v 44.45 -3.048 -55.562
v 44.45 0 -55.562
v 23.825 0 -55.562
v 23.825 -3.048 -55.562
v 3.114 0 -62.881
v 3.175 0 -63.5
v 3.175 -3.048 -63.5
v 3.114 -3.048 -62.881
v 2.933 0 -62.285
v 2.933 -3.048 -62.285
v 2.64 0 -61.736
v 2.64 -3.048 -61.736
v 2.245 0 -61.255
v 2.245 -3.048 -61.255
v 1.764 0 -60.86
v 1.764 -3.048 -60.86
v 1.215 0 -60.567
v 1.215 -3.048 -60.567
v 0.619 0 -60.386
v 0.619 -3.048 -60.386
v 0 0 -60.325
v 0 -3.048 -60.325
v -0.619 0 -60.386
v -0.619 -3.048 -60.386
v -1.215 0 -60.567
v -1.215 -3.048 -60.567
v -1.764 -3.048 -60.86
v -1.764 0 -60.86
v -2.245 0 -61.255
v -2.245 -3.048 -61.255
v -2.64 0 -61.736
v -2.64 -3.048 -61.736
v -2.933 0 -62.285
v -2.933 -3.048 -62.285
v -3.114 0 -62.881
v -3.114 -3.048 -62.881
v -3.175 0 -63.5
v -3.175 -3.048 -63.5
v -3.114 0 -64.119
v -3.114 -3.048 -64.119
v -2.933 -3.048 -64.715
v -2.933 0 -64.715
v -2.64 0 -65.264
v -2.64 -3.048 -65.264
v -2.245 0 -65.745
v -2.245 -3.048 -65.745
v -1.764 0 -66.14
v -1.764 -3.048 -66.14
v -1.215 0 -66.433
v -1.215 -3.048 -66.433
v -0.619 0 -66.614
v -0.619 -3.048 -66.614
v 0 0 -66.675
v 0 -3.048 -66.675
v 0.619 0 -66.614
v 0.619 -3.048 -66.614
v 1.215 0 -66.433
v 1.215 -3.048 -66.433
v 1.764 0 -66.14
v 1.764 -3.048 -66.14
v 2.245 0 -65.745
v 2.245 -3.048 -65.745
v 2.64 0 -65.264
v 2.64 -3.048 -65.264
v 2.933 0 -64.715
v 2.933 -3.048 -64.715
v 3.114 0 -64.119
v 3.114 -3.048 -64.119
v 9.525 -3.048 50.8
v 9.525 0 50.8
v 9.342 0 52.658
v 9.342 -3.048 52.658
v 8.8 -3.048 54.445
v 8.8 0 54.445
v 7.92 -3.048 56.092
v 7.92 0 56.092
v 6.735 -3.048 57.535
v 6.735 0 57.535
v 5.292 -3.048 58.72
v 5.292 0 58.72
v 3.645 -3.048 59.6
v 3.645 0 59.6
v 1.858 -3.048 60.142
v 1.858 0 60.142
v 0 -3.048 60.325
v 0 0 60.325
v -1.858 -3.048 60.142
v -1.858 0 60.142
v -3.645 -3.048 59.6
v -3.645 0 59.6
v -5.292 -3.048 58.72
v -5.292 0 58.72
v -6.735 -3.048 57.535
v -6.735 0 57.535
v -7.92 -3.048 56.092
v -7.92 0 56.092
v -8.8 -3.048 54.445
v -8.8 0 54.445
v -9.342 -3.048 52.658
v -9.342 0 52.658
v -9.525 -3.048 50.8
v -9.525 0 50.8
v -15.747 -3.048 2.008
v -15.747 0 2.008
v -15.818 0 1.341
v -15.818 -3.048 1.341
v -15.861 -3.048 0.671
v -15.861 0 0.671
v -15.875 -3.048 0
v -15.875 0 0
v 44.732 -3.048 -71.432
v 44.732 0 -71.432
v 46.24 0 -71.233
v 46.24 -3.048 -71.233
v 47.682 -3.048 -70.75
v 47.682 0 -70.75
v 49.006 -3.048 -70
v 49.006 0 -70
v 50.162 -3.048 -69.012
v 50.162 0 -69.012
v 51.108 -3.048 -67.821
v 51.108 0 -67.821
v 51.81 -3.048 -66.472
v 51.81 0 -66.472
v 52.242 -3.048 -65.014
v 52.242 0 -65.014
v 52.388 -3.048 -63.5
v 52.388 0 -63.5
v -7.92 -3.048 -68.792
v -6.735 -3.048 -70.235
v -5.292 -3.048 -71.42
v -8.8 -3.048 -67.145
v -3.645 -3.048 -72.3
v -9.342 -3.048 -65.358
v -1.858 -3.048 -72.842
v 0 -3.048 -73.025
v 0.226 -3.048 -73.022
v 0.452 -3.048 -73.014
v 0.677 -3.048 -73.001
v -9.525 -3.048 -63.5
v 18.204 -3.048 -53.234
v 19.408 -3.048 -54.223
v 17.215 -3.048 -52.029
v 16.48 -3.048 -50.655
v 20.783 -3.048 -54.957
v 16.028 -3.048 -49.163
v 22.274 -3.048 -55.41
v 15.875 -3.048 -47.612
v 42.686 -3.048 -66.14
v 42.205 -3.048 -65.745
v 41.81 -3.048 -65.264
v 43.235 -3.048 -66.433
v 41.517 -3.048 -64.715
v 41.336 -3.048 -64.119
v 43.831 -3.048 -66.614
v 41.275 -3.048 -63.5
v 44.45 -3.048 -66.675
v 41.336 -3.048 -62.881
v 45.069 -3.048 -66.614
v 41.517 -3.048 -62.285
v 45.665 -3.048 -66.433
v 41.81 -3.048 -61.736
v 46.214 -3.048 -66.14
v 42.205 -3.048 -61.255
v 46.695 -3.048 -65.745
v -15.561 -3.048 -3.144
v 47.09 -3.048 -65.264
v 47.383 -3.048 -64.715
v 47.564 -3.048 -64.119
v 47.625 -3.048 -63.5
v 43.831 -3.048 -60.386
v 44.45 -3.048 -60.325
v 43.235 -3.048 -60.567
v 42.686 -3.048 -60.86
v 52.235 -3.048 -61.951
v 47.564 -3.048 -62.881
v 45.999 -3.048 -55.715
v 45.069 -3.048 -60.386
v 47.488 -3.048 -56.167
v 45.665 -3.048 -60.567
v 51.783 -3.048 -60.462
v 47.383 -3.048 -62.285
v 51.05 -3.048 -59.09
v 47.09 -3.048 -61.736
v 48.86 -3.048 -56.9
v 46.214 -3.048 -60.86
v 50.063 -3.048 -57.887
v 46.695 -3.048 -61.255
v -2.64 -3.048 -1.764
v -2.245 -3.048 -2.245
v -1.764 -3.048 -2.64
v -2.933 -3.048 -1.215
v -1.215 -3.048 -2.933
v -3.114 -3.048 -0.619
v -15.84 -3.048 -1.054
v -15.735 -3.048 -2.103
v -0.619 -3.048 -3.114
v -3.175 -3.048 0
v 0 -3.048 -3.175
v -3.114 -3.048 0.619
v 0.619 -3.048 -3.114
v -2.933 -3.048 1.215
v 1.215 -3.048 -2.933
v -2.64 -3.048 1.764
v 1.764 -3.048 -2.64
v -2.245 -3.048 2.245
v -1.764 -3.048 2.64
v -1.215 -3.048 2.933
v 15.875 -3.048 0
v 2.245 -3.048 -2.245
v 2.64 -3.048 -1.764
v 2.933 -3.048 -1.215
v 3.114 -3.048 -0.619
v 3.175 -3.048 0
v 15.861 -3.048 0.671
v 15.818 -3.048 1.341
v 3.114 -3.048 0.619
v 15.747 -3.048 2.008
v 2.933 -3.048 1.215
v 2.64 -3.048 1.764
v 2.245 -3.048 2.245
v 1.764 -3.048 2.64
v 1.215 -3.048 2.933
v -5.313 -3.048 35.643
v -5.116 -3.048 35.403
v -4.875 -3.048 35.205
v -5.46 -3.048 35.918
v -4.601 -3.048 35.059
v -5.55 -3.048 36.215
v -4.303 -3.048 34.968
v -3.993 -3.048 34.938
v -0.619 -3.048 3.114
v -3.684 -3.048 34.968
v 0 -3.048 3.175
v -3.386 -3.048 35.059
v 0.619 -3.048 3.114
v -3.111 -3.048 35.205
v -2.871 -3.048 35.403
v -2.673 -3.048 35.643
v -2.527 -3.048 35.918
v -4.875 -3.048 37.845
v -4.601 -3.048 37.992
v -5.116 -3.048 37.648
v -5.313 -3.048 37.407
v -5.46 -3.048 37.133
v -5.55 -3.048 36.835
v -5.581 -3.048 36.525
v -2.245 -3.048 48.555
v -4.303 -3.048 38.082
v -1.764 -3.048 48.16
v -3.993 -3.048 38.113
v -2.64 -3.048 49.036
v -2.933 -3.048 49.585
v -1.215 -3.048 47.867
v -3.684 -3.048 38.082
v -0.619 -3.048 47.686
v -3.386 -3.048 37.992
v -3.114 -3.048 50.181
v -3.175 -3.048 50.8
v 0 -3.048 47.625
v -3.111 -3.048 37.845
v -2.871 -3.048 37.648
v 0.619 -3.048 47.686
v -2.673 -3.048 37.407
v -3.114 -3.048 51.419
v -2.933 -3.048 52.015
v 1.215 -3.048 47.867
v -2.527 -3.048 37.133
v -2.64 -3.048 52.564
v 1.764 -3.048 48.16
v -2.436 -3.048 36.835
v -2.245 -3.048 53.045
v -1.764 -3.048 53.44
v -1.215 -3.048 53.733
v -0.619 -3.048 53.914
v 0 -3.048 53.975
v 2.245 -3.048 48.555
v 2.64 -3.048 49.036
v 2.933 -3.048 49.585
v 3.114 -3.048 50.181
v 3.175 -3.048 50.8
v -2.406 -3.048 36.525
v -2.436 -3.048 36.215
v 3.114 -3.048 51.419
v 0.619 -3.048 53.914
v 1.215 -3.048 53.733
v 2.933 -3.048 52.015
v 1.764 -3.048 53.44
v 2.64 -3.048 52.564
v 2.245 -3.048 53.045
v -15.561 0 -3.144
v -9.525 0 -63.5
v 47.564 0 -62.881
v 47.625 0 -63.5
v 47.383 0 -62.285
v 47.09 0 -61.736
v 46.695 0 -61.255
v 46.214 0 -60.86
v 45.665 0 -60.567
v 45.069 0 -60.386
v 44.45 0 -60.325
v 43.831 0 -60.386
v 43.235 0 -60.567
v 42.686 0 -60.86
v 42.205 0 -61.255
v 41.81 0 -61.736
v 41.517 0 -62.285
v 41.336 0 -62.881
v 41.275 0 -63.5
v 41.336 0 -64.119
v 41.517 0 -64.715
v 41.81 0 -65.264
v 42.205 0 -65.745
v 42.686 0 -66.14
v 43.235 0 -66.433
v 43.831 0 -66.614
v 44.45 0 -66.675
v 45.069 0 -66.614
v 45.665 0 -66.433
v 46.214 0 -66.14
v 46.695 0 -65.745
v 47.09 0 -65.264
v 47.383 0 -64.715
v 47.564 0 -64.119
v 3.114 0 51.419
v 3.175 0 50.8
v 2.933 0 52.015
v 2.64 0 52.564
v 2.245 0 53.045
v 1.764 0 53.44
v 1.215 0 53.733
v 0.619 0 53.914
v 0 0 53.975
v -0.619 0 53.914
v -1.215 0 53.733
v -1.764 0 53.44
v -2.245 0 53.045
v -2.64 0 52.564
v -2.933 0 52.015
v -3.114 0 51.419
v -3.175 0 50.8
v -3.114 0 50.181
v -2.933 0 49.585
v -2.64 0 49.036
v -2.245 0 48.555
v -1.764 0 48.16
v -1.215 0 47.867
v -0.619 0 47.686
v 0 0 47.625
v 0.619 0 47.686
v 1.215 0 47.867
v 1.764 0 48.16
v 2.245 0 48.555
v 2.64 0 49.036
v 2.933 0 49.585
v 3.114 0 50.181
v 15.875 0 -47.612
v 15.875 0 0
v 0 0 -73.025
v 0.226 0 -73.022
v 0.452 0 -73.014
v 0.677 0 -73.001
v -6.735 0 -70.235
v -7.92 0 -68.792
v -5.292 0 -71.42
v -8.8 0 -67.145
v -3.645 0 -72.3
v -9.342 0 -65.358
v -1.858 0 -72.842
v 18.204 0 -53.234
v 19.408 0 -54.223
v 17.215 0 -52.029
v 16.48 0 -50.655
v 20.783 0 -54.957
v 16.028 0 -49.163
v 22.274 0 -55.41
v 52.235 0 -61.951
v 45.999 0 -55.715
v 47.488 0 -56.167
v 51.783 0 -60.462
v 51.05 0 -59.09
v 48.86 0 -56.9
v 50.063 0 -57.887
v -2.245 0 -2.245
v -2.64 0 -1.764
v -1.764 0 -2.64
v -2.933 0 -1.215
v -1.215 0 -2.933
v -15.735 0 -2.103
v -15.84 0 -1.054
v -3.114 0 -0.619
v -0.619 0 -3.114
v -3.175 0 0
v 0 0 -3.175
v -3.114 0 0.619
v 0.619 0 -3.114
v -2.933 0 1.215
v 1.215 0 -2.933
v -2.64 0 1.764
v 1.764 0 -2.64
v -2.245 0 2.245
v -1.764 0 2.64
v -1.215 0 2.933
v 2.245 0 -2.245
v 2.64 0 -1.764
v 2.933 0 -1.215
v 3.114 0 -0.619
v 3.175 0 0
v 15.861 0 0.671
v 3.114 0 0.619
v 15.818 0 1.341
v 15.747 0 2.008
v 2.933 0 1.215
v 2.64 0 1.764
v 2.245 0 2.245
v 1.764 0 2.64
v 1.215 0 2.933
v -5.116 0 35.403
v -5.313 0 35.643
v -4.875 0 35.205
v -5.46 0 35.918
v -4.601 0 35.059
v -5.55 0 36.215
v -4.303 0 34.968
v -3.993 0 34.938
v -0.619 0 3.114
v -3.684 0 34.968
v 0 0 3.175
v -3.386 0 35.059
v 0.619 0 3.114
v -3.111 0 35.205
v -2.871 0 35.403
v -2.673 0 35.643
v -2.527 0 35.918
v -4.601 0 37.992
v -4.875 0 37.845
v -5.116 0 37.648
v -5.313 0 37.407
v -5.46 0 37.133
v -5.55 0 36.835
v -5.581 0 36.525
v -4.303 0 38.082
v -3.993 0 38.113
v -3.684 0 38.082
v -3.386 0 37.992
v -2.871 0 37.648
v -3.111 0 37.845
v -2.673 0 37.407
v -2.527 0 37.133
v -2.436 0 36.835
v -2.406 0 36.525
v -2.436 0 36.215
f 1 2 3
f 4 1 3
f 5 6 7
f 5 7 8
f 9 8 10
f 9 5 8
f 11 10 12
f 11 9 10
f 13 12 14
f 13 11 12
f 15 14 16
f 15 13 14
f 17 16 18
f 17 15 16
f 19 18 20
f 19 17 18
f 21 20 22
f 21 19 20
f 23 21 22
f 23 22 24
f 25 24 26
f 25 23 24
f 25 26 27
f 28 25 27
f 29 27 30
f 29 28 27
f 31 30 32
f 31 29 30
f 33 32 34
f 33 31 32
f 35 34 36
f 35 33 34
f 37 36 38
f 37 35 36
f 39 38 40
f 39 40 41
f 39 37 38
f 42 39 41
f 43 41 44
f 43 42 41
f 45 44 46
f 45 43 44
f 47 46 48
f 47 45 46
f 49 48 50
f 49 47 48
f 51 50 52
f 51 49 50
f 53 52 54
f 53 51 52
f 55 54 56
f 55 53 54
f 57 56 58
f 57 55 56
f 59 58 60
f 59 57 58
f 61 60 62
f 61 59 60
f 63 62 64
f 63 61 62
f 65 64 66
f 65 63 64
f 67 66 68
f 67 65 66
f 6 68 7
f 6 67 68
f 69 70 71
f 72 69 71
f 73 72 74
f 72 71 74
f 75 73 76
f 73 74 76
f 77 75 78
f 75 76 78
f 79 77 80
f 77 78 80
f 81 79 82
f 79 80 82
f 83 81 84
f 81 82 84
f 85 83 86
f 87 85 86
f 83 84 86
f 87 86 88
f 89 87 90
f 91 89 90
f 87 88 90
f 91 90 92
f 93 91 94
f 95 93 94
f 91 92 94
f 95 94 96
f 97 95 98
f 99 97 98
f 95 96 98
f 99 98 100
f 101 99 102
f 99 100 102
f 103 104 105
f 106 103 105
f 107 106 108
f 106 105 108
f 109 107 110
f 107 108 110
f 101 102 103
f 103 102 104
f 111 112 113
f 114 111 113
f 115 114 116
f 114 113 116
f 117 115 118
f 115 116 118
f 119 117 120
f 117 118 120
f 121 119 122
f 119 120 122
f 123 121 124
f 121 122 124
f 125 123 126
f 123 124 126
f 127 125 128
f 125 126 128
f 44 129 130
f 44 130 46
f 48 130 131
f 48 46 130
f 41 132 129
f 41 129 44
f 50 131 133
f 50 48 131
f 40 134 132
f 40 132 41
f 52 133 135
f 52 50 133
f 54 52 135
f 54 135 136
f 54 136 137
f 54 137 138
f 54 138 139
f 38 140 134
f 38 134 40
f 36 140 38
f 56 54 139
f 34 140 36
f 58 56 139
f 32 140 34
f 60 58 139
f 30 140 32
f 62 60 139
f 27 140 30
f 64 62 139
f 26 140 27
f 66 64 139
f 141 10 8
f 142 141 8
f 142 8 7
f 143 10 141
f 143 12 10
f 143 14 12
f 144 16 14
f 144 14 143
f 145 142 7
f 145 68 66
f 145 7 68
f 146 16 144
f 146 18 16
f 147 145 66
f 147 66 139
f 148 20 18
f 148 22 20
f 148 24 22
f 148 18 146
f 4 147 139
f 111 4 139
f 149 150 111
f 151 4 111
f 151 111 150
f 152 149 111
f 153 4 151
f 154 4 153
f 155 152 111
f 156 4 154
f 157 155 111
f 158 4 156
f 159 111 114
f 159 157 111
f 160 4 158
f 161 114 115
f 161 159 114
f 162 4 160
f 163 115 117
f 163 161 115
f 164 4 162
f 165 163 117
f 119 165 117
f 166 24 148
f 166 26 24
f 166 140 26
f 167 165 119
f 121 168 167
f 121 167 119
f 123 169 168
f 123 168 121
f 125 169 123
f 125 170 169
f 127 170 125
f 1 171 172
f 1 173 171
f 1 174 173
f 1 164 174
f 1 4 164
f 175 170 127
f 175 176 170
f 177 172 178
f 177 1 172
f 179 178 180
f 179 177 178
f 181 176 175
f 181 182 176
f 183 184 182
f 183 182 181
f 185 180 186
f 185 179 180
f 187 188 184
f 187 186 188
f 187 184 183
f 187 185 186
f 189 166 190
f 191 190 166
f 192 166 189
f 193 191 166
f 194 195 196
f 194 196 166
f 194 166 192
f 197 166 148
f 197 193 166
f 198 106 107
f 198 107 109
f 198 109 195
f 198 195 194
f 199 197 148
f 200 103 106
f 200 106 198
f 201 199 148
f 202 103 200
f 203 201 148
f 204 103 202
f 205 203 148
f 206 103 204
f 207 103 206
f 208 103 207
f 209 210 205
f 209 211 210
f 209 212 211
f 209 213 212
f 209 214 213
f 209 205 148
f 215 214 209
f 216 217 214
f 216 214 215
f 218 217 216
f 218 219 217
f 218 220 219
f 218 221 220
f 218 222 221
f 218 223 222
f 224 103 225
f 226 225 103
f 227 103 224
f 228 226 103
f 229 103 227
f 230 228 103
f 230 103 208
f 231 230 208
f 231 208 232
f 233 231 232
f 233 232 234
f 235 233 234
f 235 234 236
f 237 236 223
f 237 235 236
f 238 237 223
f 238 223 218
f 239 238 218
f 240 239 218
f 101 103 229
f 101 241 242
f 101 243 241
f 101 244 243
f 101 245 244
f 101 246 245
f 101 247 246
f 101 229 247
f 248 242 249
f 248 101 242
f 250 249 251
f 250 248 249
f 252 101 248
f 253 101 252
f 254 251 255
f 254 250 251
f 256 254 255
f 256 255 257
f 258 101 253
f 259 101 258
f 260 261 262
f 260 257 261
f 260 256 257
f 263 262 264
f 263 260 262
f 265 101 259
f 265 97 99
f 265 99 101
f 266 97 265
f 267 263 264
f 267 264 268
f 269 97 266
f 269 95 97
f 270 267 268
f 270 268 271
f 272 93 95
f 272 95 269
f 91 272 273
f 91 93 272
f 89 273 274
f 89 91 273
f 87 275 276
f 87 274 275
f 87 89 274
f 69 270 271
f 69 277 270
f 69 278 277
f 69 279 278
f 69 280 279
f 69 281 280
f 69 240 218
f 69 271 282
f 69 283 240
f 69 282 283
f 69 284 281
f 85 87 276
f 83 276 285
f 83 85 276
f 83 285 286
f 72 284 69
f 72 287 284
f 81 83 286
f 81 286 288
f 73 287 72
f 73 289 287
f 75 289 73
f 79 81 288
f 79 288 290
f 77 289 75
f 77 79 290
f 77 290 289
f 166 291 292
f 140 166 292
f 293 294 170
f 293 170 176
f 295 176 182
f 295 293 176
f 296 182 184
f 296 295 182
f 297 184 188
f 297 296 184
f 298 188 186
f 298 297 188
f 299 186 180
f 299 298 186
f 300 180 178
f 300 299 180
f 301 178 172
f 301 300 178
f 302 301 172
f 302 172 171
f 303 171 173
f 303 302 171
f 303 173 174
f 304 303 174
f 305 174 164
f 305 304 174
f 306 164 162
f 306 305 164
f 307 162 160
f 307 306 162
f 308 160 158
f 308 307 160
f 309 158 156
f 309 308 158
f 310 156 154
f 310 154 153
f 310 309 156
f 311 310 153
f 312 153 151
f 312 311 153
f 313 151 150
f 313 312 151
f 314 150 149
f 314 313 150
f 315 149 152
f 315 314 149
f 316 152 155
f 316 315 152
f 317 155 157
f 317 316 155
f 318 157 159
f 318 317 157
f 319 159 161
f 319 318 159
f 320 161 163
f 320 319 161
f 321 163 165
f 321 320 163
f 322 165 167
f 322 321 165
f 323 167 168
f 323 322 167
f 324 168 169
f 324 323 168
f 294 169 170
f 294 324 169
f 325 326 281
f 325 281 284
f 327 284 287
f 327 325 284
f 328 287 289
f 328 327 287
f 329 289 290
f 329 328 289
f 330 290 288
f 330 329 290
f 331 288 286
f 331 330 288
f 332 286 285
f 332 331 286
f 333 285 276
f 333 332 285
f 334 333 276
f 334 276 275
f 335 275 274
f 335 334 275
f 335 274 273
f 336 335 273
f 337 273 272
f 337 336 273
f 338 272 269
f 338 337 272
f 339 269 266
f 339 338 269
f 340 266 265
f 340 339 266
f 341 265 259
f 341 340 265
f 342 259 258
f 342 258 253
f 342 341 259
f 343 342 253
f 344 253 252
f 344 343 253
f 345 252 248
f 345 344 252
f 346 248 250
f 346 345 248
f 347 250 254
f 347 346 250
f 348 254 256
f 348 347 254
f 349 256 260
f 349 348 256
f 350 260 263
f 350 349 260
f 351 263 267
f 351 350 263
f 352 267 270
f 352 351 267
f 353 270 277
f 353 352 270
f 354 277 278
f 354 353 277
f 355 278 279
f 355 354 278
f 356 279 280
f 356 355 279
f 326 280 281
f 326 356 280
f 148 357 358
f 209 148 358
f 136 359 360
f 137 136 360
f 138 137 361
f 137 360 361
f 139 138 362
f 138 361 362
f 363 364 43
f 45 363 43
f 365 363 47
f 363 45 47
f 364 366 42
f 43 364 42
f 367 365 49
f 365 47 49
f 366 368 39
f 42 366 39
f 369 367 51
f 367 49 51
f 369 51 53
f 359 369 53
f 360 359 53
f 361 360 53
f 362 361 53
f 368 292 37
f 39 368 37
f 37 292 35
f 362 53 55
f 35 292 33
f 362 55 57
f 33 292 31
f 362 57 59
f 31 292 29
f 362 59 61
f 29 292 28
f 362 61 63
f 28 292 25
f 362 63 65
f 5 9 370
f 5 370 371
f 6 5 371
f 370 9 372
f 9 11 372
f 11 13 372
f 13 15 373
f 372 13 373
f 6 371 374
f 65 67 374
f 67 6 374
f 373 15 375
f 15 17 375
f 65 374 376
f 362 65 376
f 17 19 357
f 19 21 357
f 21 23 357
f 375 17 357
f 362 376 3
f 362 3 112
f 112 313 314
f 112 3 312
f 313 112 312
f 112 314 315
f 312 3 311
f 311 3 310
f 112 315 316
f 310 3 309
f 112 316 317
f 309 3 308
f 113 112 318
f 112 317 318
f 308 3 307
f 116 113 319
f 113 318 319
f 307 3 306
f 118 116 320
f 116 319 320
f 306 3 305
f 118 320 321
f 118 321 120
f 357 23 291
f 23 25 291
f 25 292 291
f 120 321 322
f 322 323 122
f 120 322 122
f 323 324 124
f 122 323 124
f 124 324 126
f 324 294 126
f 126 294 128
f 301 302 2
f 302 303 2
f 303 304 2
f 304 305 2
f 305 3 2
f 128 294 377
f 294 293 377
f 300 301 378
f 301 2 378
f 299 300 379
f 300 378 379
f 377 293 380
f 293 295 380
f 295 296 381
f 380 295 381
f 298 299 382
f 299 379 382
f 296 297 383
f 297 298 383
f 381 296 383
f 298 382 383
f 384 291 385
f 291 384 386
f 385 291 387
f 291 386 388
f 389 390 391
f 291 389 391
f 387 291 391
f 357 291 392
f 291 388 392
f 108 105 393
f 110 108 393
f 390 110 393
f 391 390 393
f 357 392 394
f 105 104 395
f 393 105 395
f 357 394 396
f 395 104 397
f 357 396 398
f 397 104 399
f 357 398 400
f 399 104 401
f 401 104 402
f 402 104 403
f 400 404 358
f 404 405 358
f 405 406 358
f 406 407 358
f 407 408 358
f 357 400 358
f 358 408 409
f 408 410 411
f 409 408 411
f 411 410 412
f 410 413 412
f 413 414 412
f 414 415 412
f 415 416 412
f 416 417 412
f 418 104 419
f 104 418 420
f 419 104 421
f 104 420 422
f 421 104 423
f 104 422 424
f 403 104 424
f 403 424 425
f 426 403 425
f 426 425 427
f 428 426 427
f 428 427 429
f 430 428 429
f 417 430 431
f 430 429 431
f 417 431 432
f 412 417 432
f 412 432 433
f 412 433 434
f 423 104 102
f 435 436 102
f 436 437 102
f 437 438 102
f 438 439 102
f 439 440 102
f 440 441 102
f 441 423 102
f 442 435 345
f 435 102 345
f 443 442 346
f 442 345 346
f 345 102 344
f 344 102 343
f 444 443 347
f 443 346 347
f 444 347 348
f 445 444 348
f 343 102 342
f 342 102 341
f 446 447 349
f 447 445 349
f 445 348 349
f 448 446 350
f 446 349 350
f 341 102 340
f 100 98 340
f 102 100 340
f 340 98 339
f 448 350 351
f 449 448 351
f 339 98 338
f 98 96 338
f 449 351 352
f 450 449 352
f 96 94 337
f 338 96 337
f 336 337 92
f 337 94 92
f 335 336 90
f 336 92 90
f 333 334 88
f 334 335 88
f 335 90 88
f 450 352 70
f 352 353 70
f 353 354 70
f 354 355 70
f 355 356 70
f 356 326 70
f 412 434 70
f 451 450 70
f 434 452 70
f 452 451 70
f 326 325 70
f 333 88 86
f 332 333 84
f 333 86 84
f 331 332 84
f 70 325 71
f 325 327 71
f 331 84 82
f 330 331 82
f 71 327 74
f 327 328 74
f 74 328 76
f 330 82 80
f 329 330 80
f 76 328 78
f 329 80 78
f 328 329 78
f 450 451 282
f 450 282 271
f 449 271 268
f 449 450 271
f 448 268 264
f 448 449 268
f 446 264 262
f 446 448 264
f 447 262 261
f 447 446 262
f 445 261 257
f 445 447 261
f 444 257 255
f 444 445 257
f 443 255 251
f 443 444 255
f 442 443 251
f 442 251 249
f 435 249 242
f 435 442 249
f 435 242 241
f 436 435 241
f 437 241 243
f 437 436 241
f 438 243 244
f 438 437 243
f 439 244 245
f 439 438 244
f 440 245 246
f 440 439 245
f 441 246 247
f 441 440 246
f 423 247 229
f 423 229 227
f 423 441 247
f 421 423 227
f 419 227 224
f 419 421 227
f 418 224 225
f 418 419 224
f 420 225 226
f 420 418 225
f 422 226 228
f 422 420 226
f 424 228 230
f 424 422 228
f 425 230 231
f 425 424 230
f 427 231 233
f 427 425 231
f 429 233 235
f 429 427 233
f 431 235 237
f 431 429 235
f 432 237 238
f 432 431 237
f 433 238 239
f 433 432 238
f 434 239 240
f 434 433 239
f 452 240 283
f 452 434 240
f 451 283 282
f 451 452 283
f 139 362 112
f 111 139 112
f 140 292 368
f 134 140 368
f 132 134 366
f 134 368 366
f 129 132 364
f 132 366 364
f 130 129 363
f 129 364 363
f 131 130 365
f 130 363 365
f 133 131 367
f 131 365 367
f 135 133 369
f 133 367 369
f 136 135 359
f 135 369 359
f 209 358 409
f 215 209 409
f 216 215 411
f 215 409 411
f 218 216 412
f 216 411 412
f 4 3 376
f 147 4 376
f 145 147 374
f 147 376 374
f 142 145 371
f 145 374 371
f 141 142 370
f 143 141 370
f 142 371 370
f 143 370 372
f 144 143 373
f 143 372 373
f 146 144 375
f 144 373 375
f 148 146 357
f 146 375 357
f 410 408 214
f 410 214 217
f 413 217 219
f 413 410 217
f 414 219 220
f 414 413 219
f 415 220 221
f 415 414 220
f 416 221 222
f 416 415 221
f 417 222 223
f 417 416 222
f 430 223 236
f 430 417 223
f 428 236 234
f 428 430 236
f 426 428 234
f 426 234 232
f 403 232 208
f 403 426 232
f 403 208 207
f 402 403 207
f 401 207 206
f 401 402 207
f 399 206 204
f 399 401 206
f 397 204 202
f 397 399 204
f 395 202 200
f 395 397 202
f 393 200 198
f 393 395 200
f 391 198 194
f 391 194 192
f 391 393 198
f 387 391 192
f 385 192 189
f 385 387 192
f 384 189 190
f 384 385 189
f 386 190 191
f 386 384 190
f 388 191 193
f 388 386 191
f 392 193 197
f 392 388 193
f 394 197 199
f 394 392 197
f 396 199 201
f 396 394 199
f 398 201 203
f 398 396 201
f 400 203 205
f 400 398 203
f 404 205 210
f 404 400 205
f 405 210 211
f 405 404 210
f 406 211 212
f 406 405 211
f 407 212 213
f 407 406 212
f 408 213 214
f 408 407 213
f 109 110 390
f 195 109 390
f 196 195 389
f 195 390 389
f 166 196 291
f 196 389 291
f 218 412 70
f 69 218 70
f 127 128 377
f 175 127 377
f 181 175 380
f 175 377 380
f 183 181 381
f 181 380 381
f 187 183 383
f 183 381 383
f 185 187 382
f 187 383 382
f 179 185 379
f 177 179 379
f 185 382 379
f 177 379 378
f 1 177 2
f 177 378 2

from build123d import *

# Parameters (mm, degrees)
F0_R     = 3.175
F0_R_2   = 1.5875
F1_DEPTH = 3.048


with BuildPart() as f1:
    # F0 (on Front) → F1 (new body)
    with BuildSketch(Plane.XZ):
        with BuildLine():
            ThreePointArc((15.747457, 2.008289), (0, 15.875), (-15.747457, 2.008289))
            ThreePointArc((-15.747457, 2.008289), (-15.843082, 1.006168), (-15.875, 0))
            Line((-15.875, 0), (-15.560644, -3.143564))
            ThreePointArc((-15.560644, -3.143564), (1.579622, -15.796215), (15.875, 0))
            ThreePointArc((15.875, 0), (15.843082, 1.006168), (15.747457, 2.008289))
        make_face()
        Circle(F0_R, mode=Mode.SUBTRACT)
        with BuildLine():
            Line((-9.525, 50.8), (-15.747457, 2.008289))
            ThreePointArc((-15.747457, 2.008289), (0, 15.875), (15.747457, 2.008289))
            Line((15.747457, 2.008289), (9.525, 50.8))
            ThreePointArc((9.525, 50.8), (0, 41.275), (-9.525, 50.8))
        make_face()
        with Locations((-3.993369, 36.5252)):
            Circle(F0_R_2, mode=Mode.SUBTRACT)
        with BuildLine():
            Line((-15.560644, -3.143564), (-15.875, 0))
            ThreePointArc((-15.875, 0), (-15.796215, -1.579622), (-15.560644, -3.143564))
        make_face()
        with BuildLine():
            ThreePointArc((9.525, 50.8), (0, 60.325), (-9.525, 50.8))
            ThreePointArc((-9.525, 50.8), (0, 41.275), (9.525, 50.8))
        make_face()
        with Locations((0, 50.8)):
            Circle(F0_R, mode=Mode.SUBTRACT)
        with BuildLine():
            ThreePointArc((15.875, 0), (1.579622, -15.796215), (-15.560644, -3.143564))
            Line((-15.560644, -3.143564), (-9.525, -63.5))
            ThreePointArc((-9.525, -63.5), (0, -53.975), (9.525, -63.5))
            ThreePointArc((9.525, -63.5), (6.970557, -69.991299), (0.677344, -73.000886))
            Line((0.677344, -73.000886), (44.732405, -71.432475))
            ThreePointArc((44.732405, -71.432475), (36.513756, -63.641225), (44.45, -55.5625))
            Line((44.45, -55.5625), (23.8252, -55.5625))
            ThreePointArc((23.8252, -55.5625), (18.20356, -53.23394), (15.875, -47.6123))
            Line((15.875, -47.6123), (15.875, 0))
        make_face()
        with BuildLine():
            ThreePointArc((9.525, -63.5), (0, -53.975), (-9.525, -63.5))
            ThreePointArc((-9.525, -63.5), (-6.735192, -70.235192), (0, -73.025))
            Line((0, -73.025), (0.677344, -73.000886))
            ThreePointArc((0.677344, -73.000886), (6.970557, -69.991299), (9.525, -63.5))
        make_face()
        with Locations((0, -63.5)):
            Circle(F0_R, mode=Mode.SUBTRACT)
        with BuildLine():
            Line((0.677344, -73.000886), (0, -73.025))
            ThreePointArc((0, -73.025), (0.338886, -73.01897), (0.677344, -73.000886))
        make_face()
        with BuildLine():
            ThreePointArc((52.3875, -63.5), (50.06266, -57.88734), (44.45, -55.5625))
            ThreePointArc((44.45, -55.5625), (36.513756, -63.641225), (44.732405, -71.432475))
            ThreePointArc((44.732405, -71.432475), (50.161633, -69.01191), (52.3875, -63.5))
        make_face()
        with Locations((44.45, -63.5)):
            Circle(F0_R, mode=Mode.SUBTRACT)
    extrude(amount=F1_DEPTH)


solid = f1.part
